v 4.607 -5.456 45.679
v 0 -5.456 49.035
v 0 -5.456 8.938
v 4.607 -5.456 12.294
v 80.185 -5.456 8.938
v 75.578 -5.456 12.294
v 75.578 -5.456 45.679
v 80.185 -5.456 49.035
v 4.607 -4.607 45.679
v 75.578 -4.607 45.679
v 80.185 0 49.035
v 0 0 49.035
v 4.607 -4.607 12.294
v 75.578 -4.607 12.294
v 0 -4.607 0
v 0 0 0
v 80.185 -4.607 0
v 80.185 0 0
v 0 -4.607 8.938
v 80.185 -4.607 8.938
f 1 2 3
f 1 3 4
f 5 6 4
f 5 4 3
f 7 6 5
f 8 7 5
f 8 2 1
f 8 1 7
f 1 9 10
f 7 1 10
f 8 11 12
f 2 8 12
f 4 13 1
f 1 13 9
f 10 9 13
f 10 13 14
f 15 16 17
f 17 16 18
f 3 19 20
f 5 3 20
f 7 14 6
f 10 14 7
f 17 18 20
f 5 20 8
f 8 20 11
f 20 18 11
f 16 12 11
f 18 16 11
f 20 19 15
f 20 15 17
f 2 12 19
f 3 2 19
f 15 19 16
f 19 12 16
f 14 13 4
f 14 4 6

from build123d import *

# Parameters (mm, degrees)
F1_W     = 141.67
F1_H     = 70.844
F1_H_2   = 15.791
F2_DEPTH = 8.14
F3_W     = 125.39
F3_H     = 58.984
F4_DEPTH = 1.5
F5_SCALE = 0.566


with BuildPart() as f2:
    # F1 (on Front) → F2 (new body)
    with BuildSketch(Plane.XZ):
        with Locations((70.835, 51.213)):
            Rectangle(F1_W, F1_H)
        with Locations((70.835, 7.8955)):
            Rectangle(F1_W, F1_H_2)
    extrude(amount=F2_DEPTH)

    # F3 (on offset) → F4 (join)
    with BuildSketch(Plane.XZ.offset(8.14)):
        Polygon((0, 86.635), (0, 15.791), (141.67, 15.791), (141.67, 21.721), (141.67, 80.705), (141.67, 86.635), (133.53, 86.635), (8.14, 86.635), align=None)
        with Locations((70.835, 51.213)):
            Rectangle(F3_W, F3_H, mode=Mode.SUBTRACT)
    extrude(amount=F4_DEPTH)


with BuildPart() as f2_1:
    # F5: moved
    add(f2.part.scale(F5_SCALE))


solid = f2_1.part
